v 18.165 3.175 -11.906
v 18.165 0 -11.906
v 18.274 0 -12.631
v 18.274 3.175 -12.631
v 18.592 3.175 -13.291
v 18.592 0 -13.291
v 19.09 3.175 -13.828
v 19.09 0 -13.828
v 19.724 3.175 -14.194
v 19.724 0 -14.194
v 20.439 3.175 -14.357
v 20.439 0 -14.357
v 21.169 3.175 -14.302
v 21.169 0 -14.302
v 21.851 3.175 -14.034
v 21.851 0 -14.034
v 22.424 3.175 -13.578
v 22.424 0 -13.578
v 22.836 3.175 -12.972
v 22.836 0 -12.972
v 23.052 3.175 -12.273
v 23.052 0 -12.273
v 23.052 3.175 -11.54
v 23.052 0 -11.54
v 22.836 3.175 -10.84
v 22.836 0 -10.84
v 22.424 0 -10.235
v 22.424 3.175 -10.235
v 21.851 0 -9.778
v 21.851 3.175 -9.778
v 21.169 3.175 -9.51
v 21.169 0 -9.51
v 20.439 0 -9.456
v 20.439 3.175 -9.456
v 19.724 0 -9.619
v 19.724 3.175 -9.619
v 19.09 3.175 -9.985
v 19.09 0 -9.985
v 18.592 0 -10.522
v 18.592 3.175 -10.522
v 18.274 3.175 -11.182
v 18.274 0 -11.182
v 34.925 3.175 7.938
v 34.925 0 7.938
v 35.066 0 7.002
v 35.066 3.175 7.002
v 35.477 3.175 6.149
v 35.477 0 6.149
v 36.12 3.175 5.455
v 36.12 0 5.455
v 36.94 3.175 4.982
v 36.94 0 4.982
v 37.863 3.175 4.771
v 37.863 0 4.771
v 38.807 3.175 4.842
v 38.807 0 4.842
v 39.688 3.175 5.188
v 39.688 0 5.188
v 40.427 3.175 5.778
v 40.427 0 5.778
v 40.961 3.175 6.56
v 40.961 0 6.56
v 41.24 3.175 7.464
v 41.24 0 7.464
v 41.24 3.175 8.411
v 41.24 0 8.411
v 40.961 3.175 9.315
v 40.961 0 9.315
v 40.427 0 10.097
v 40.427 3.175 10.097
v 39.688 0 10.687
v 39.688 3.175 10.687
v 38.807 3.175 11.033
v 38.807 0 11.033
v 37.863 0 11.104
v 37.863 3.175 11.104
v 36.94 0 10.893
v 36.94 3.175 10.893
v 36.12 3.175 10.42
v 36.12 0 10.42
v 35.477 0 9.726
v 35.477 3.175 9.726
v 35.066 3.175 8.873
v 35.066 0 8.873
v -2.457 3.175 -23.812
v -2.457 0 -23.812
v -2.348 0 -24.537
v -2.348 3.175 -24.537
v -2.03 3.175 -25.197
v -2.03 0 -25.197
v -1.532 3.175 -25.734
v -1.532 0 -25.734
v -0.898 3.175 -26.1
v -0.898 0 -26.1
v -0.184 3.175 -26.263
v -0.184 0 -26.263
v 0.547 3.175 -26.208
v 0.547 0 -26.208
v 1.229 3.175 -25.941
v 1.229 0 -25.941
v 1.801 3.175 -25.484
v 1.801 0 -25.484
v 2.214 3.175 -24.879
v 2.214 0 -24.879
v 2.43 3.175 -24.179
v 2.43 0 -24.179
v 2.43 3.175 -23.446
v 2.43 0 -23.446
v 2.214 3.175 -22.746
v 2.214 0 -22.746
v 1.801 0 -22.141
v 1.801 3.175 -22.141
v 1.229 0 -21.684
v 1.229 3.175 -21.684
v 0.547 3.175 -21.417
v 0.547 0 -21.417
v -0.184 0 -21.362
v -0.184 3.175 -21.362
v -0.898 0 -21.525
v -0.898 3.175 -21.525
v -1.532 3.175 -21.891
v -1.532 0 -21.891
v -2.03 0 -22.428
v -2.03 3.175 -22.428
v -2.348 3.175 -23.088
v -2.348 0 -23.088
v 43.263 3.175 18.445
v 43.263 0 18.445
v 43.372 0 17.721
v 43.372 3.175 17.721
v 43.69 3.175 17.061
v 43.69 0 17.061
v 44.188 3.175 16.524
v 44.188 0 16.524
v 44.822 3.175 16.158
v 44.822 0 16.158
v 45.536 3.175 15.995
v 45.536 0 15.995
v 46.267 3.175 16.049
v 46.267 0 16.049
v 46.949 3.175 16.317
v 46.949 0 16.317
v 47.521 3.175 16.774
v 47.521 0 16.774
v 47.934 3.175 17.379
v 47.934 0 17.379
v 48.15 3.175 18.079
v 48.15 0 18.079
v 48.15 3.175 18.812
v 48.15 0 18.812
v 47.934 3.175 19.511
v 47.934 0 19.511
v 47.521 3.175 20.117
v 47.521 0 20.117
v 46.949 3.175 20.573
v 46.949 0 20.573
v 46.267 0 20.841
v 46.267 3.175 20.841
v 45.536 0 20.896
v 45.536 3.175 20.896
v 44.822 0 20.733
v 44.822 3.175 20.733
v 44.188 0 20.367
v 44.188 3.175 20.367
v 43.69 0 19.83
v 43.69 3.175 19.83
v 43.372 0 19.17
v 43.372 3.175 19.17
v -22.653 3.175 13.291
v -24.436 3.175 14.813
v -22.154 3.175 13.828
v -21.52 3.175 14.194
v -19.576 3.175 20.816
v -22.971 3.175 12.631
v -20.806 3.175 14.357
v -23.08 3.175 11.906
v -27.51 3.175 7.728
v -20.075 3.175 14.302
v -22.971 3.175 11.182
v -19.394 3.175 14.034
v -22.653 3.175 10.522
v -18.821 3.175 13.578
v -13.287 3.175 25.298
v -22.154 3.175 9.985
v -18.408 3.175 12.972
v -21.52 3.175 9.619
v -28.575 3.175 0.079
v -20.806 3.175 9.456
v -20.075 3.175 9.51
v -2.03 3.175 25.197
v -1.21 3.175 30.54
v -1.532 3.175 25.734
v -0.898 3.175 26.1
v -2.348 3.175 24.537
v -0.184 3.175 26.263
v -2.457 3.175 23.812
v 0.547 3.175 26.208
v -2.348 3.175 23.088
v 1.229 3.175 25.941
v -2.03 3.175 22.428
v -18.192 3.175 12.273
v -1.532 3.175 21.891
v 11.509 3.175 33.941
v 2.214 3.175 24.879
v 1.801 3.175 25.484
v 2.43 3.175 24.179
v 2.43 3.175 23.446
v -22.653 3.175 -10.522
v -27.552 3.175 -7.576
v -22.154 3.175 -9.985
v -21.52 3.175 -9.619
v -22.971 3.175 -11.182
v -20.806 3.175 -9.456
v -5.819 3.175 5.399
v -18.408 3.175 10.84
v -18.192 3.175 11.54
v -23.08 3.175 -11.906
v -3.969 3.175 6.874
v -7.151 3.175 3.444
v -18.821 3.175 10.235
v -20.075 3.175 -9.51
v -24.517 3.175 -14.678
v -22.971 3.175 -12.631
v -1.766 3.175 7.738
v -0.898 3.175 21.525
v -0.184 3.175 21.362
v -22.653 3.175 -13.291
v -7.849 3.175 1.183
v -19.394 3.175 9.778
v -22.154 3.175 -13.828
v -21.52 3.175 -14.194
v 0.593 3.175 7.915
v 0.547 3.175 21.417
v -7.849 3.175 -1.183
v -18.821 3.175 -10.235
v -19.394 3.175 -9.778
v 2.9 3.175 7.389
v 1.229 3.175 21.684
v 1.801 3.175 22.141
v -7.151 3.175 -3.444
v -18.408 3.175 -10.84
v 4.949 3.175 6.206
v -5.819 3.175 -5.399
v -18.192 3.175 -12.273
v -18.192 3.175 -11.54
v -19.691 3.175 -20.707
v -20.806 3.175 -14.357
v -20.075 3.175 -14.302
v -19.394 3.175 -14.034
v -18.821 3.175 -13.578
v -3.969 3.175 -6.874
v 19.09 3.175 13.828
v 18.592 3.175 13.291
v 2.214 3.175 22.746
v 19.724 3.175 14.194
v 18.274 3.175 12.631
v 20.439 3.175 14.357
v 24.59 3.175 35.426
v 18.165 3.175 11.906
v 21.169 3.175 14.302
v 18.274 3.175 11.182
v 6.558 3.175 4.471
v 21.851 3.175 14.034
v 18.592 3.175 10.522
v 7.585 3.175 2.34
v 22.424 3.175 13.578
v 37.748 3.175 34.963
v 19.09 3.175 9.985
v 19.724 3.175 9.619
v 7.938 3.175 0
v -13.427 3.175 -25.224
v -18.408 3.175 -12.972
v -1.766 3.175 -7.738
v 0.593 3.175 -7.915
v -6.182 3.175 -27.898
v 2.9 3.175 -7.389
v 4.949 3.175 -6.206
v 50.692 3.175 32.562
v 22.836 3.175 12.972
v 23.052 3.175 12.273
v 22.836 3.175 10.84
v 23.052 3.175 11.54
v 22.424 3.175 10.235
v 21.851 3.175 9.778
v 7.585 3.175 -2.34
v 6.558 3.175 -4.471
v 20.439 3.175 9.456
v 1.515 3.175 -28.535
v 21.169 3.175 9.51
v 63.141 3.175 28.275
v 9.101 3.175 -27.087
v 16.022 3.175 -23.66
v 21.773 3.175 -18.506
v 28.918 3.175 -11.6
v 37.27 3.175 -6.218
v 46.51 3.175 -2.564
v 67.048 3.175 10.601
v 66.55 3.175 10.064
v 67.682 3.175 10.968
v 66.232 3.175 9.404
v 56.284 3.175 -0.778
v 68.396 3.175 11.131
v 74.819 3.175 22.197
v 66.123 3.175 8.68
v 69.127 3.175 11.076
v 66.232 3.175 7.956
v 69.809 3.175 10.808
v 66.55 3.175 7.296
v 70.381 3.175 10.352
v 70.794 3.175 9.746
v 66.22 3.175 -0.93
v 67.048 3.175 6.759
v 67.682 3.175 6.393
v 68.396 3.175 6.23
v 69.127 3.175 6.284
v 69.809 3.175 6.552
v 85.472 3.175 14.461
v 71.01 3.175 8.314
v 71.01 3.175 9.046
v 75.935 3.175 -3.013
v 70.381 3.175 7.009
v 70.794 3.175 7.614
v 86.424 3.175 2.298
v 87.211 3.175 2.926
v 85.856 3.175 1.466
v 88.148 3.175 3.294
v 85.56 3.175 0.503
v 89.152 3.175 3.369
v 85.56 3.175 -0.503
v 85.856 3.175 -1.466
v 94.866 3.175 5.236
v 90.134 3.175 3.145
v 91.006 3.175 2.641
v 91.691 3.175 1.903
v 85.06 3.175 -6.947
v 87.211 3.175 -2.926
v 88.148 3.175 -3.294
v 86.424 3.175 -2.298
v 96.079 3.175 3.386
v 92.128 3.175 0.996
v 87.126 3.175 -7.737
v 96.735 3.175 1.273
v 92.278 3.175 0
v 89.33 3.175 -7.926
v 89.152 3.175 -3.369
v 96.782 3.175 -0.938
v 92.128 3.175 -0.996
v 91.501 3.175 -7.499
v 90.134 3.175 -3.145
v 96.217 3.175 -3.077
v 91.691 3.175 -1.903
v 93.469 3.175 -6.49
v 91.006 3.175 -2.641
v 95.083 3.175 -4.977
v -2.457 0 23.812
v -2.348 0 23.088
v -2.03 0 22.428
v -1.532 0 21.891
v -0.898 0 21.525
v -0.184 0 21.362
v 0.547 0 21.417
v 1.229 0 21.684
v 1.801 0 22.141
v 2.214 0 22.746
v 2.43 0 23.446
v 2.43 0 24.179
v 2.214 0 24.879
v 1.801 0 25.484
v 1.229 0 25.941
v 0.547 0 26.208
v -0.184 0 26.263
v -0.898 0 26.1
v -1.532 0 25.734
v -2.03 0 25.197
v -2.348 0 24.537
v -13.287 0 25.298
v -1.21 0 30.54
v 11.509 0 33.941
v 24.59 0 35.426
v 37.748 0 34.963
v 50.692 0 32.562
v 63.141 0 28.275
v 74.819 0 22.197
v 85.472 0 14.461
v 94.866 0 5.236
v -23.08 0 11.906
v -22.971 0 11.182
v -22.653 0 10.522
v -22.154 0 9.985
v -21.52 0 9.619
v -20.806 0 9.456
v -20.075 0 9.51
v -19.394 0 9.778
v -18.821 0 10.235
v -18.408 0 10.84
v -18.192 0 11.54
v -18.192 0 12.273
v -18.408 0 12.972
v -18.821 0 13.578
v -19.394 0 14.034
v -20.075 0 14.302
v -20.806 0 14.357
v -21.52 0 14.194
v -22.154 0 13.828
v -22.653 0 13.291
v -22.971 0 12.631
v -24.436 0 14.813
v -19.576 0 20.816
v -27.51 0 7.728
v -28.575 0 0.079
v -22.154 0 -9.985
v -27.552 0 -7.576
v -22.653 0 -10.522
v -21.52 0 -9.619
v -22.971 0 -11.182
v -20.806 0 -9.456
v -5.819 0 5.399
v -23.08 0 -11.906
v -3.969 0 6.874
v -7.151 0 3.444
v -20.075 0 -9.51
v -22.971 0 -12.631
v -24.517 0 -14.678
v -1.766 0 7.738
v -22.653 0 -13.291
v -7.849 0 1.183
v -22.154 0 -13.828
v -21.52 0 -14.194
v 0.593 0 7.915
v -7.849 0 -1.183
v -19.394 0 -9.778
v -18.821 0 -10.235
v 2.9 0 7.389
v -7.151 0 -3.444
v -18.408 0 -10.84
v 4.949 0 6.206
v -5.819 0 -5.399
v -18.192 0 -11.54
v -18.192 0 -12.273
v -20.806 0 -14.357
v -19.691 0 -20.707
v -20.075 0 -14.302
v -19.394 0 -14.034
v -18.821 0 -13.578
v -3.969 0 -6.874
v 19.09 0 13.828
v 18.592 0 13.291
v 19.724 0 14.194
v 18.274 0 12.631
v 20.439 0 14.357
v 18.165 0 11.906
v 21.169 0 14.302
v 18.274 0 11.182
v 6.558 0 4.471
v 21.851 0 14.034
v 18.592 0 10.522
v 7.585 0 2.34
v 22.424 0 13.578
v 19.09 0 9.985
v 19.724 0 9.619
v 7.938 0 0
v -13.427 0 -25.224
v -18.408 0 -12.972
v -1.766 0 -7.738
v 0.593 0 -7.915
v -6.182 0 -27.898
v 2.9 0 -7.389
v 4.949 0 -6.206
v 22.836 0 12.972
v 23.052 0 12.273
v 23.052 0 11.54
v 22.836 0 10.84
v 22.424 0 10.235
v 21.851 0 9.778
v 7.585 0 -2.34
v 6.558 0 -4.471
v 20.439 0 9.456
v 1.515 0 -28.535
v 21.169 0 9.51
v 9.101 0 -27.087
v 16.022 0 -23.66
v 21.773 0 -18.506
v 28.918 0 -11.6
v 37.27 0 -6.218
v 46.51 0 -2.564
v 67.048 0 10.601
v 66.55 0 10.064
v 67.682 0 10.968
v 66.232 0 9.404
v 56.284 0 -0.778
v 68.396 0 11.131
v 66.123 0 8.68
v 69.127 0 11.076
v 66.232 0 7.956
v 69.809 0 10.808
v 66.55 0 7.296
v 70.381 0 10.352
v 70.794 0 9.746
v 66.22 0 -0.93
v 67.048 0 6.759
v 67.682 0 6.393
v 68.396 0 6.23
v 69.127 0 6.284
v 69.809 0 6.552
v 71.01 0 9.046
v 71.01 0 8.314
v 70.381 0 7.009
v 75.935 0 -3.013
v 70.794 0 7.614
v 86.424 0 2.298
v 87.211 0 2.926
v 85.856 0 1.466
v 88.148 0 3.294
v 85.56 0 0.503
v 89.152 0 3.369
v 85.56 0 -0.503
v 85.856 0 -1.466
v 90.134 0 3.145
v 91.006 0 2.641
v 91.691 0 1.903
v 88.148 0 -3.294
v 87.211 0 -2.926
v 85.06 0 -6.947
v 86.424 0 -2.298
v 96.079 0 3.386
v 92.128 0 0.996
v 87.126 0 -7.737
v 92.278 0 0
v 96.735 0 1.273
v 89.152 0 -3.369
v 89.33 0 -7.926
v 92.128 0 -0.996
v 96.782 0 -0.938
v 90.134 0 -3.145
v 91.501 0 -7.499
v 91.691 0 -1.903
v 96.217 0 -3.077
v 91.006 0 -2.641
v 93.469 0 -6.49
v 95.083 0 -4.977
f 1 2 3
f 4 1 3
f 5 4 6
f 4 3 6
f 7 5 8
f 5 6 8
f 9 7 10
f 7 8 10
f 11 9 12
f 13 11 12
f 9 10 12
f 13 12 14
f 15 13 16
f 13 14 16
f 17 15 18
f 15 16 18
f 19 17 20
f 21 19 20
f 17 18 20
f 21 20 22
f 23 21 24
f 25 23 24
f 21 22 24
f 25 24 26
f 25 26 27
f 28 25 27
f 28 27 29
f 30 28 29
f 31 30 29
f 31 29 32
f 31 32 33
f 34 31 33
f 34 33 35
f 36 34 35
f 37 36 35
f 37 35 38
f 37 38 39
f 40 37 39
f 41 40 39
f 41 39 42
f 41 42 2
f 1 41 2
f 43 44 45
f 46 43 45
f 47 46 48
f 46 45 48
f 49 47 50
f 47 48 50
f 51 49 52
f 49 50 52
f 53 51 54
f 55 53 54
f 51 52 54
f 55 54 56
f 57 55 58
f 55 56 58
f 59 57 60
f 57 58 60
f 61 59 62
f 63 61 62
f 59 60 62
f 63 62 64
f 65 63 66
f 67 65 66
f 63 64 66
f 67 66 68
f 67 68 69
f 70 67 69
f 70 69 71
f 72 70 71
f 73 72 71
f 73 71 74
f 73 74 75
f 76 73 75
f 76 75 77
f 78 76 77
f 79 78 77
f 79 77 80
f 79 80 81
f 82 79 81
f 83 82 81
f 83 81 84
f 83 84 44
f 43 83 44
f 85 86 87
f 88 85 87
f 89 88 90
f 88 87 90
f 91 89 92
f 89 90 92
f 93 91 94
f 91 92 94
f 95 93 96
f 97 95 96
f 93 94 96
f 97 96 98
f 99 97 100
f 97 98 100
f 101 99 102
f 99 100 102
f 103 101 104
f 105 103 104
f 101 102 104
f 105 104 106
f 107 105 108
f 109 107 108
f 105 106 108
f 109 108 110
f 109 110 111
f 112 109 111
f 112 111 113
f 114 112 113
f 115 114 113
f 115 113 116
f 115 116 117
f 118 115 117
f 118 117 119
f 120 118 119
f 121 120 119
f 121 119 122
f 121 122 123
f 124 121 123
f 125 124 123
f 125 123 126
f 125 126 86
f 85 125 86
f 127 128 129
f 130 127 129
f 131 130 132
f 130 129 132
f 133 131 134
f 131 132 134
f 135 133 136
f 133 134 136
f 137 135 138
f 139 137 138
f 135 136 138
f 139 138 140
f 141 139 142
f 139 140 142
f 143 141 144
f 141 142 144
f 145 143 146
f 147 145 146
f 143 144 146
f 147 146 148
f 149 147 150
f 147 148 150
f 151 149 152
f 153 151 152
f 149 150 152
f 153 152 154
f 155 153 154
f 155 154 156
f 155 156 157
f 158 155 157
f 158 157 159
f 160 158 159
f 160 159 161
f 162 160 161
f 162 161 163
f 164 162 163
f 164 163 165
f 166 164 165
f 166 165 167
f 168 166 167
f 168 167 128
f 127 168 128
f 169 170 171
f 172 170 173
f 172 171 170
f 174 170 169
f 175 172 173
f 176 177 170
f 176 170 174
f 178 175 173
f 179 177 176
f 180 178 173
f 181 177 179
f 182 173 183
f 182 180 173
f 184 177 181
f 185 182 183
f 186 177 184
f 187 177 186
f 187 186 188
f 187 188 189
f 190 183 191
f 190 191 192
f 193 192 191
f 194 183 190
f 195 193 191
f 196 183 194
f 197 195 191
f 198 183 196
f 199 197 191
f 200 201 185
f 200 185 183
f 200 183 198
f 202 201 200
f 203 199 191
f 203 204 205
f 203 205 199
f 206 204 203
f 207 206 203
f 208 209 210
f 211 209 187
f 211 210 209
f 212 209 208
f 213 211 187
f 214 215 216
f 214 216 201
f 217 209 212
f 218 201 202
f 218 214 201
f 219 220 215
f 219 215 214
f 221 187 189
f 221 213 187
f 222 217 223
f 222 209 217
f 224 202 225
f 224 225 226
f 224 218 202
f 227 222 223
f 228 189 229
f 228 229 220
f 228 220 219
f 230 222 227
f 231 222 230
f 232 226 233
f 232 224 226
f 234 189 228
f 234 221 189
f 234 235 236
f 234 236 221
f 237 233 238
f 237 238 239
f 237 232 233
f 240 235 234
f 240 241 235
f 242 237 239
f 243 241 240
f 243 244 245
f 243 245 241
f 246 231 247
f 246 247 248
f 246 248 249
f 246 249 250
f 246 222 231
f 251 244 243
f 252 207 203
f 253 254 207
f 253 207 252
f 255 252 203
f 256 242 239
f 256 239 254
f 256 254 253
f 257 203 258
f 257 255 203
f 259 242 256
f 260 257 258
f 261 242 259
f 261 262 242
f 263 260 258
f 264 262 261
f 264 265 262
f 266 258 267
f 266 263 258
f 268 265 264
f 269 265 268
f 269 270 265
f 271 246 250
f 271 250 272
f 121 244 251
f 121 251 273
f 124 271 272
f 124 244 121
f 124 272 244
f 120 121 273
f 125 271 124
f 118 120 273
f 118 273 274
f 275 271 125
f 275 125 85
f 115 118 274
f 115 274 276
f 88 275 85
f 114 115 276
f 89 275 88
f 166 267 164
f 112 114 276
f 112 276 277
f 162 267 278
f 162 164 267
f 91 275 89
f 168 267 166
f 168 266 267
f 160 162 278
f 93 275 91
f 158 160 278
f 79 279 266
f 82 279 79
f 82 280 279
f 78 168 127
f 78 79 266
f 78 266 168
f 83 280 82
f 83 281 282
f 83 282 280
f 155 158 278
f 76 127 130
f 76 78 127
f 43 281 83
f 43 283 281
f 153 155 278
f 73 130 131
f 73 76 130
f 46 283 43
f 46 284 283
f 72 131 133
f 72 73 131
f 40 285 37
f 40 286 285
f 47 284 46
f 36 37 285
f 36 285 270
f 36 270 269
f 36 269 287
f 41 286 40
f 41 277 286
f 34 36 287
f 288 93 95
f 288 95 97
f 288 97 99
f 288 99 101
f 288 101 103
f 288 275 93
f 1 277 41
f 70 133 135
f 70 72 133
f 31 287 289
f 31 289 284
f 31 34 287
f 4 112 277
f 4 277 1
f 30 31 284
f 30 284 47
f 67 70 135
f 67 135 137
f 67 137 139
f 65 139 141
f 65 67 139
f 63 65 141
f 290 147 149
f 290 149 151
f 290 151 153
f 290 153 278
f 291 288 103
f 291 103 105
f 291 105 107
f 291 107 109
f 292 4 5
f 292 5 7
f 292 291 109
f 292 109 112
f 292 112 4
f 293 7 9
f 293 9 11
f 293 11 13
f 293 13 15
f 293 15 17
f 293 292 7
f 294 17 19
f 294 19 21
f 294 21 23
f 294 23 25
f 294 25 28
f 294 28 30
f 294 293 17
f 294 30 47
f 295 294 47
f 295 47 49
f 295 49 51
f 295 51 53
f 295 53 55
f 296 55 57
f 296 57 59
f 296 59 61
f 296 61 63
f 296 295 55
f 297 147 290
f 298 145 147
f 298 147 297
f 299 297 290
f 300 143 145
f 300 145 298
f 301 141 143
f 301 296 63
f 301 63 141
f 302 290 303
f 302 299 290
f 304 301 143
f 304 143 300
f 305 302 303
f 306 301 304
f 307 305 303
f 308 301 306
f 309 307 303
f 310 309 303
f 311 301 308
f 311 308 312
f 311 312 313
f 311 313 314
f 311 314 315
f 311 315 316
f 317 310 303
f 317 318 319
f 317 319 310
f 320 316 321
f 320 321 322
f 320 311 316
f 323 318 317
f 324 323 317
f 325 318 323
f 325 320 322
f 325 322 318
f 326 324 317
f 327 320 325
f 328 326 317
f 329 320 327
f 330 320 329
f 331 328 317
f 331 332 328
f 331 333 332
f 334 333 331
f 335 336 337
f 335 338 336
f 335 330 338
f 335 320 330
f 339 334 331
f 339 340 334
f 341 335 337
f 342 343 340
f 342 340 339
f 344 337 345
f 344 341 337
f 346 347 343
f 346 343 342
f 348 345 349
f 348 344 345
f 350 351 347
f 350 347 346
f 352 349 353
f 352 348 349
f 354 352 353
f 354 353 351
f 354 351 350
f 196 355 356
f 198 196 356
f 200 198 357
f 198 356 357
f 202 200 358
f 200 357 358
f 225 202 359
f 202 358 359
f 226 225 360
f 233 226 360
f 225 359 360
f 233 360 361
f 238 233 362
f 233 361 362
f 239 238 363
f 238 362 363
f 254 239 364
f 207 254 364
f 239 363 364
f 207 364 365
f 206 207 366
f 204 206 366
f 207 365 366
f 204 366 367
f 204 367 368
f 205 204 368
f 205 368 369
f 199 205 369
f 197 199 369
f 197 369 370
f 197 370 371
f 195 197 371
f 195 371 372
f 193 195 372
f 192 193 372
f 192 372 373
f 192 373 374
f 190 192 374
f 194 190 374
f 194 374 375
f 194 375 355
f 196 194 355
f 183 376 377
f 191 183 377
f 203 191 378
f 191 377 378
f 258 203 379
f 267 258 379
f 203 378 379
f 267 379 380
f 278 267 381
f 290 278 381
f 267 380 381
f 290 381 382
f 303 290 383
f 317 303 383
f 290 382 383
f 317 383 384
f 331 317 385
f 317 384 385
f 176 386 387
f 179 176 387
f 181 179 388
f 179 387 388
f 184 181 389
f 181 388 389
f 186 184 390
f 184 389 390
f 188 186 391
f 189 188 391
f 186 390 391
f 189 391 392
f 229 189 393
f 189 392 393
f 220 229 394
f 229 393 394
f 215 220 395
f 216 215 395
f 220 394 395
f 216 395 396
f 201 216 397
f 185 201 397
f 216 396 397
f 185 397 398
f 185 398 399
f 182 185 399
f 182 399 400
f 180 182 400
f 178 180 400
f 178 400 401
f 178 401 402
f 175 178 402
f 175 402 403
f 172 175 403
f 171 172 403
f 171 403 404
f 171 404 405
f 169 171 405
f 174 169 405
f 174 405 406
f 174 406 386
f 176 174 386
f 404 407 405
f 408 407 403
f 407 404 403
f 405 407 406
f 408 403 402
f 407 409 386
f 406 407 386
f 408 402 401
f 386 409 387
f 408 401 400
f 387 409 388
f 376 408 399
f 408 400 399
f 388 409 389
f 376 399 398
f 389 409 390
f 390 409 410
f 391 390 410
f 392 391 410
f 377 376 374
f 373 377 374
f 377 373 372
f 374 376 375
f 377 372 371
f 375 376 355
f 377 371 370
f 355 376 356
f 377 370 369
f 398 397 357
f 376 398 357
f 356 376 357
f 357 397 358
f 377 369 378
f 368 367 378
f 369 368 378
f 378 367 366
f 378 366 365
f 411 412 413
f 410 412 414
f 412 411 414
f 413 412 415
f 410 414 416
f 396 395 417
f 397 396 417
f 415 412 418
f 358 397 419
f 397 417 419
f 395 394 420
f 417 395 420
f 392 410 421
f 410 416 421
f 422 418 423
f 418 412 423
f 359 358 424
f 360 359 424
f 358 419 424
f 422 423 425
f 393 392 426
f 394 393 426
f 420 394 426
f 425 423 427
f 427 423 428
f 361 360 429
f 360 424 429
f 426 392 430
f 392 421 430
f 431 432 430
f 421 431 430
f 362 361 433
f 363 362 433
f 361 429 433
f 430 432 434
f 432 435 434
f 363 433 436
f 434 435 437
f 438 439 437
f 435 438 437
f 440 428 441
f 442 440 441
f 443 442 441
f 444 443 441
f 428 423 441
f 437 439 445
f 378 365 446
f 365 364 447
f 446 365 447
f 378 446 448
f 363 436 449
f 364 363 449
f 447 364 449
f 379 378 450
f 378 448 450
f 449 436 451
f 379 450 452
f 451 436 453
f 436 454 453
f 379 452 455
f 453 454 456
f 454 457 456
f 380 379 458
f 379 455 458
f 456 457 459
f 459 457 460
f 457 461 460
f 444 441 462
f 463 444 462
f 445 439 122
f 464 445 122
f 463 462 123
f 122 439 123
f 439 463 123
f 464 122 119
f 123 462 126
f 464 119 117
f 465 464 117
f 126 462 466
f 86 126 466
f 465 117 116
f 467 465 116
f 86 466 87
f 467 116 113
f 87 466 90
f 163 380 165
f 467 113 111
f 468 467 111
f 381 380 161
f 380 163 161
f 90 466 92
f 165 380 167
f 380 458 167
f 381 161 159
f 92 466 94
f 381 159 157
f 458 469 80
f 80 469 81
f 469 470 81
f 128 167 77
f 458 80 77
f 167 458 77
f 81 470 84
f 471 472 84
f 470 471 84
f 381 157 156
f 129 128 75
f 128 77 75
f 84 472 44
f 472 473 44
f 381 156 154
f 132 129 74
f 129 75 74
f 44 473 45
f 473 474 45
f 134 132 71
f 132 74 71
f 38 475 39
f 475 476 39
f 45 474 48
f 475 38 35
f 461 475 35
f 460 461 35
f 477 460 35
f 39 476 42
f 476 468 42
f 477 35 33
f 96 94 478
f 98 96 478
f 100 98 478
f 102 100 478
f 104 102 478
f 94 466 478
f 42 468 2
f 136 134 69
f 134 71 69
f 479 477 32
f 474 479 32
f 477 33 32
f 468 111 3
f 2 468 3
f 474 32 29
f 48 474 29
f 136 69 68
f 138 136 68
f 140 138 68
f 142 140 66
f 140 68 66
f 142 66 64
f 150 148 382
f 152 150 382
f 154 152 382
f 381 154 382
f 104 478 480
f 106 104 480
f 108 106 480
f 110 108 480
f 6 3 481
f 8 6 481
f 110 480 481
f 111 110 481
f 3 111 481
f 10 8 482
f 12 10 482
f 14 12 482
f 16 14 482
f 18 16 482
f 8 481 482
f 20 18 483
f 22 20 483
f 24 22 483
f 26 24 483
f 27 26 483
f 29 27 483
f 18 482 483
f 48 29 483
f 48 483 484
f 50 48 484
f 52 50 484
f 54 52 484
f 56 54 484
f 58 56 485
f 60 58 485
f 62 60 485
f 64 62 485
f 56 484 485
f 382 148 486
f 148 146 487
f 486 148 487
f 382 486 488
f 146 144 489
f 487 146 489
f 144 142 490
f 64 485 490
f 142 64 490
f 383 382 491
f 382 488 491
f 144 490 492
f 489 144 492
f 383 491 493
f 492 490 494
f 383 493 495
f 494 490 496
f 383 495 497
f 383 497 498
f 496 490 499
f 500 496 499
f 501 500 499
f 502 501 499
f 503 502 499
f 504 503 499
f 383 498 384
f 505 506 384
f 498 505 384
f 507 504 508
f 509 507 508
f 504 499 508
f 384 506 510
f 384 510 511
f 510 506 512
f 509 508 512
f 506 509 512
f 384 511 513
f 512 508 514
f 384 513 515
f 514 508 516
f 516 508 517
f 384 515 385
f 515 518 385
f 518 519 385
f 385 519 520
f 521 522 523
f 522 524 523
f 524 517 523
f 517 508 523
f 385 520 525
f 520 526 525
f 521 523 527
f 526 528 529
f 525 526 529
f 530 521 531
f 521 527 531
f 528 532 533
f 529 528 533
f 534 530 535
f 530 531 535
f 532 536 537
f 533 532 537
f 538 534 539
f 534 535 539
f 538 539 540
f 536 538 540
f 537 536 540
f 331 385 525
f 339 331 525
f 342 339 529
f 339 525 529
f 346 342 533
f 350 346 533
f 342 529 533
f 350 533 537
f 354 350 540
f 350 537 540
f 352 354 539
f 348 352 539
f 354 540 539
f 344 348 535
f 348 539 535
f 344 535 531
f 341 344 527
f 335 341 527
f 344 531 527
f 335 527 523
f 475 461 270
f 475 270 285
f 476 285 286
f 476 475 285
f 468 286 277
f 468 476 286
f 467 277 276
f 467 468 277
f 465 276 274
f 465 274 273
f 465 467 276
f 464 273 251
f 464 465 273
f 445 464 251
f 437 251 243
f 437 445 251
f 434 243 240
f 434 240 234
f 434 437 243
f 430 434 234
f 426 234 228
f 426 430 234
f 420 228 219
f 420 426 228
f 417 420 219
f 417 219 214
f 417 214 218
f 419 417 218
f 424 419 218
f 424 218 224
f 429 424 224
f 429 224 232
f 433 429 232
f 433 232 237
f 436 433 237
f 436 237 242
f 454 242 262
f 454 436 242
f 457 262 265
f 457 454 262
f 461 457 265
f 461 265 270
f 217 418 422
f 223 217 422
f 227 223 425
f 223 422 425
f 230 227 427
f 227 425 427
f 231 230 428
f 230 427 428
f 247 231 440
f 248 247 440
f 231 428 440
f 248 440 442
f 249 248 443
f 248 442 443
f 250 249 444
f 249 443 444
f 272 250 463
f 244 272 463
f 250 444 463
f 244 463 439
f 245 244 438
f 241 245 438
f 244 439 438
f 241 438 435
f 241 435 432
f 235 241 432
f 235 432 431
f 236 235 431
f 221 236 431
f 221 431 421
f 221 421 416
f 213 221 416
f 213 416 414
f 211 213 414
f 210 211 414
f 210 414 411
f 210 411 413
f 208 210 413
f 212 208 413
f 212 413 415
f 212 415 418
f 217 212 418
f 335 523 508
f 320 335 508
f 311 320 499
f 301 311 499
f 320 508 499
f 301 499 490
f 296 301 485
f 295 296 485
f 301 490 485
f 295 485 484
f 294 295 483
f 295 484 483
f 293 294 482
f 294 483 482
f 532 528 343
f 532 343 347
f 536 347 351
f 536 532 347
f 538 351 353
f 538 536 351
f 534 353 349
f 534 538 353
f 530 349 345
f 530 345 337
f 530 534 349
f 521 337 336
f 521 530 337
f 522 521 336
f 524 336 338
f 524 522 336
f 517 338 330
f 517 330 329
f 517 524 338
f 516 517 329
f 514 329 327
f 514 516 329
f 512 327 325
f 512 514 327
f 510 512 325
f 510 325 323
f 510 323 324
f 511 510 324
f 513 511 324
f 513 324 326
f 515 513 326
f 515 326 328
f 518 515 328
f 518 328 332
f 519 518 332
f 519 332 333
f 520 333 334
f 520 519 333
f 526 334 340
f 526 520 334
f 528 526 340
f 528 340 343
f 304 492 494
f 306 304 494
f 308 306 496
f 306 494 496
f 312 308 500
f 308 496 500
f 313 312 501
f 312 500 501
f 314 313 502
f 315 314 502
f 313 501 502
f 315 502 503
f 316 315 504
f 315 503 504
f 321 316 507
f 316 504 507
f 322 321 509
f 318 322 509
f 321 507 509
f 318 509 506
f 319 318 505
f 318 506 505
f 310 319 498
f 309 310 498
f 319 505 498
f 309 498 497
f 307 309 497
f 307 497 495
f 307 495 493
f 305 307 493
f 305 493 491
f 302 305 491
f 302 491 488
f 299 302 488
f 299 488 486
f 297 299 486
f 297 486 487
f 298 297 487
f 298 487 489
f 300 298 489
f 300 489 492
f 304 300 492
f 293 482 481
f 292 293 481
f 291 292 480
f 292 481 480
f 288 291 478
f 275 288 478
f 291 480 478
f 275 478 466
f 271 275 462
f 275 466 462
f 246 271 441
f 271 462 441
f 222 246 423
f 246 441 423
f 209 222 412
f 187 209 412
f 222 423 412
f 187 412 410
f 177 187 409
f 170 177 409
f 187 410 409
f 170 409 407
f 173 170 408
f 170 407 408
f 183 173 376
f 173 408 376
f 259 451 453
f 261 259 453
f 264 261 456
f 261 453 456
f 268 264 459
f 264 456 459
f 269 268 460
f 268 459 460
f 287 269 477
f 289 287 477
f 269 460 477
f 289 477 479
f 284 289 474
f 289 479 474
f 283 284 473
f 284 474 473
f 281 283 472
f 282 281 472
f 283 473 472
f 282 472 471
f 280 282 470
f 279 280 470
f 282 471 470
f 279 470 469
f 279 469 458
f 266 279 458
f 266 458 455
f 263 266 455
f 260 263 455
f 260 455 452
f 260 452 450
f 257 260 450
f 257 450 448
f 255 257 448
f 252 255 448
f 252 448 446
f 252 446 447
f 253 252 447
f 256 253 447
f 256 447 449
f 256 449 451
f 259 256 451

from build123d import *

# Parameters (mm, degrees)
SKETCH1_R                        = 7.9375
SKETCH1_R_2                      = 3.3782
BOSS_EXTRUDE1_DEPTH              = 3.175
F_10_0_1935_DIAMETER_HOLE1_D     = 4.9149
F_1_4_0_25_DIAMETER_HOLE2_D      = 6.35
F_10_0_1935_DIAMETER_HOLE2_D     = 4.9149
F_10_0_1935_DIAMETER_HOLE2_DEPTH = 12.0396
F_10_0_1935_DIAMETER_HOLE2_TIP   = 1.476584928


with BuildPart() as part:
    # Sketch1 → Boss-Extrude1 (new body)
    with BuildSketch(Plane(origin=(0, 0, 0), x_dir=(1, 0, 0), z_dir=(0, 1, 0))):
        with BuildLine():
            ThreePointArc((21.773129464, 18.505714208), (-22.309015306, 17.856048305), (-13.287106438, -25.297893737))
            ThreePointArc((-13.287106438, -25.297893737), (44.264595617, -34.002230789), (94.865631565, -5.235947505))
            ThreePointArc((94.865631565, -5.235947505), (95.083258514, 4.977069459), (85.059583132, 6.946589417))
            ThreePointArc((85.059583132, 6.946589417), (51.353410938, 1.431482164), (21.773129464, 18.505714208))
        make_face()
        Circle(SKETCH1_R, mode=Mode.SUBTRACT)
        with Locations((88.9, 0)):
            Circle(SKETCH1_R_2, mode=Mode.SUBTRACT)
    extrude(amount=BOSS_EXTRUDE1_DEPTH)

    # #10 (0.1935) Diameter Hole1 (through all)
    with Locations(Plane(origin=(0, 3.175, 0), x_dir=(1, 0, 0), z_dir=(0, 1, 0))):
        with Locations((0, -23.8125), (-20.622229928, 11.90625), (20.622229928, 11.90625), (20.622229928, -11.90625), (-20.622229928, -11.90625), (0, 23.8125)):
            Hole(F_10_0_1935_DIAMETER_HOLE1_D / 2)

    # 1/4 (0.25) Diameter Hole2 (through all)
    with Locations(Plane(origin=(0, 3.175, 0), x_dir=(1, 0, 0), z_dir=(0, 1, 0))):
        with Locations((38.1, -7.9375)):
            Hole(F_1_4_0_25_DIAMETER_HOLE2_D / 2)

    # #10 (0.1935) Diameter Hole2
    with Locations(Plane(origin=(0, 3.175, 0), x_dir=(1, 0, 0), z_dir=(0, 1, 0))):
        with Locations((68.58, -8.680112147), (45.72, -18.445238312)):
            Hole(F_10_0_1935_DIAMETER_HOLE2_D / 2, depth=F_10_0_1935_DIAMETER_HOLE2_DEPTH)
            with Locations((0, 0, -(F_10_0_1935_DIAMETER_HOLE2_DEPTH + F_10_0_1935_DIAMETER_HOLE2_TIP / 2))):  # 118° drill point
                Cone(0, F_10_0_1935_DIAMETER_HOLE2_D / 2, F_10_0_1935_DIAMETER_HOLE2_TIP, mode=Mode.SUBTRACT)


solid = part.part
